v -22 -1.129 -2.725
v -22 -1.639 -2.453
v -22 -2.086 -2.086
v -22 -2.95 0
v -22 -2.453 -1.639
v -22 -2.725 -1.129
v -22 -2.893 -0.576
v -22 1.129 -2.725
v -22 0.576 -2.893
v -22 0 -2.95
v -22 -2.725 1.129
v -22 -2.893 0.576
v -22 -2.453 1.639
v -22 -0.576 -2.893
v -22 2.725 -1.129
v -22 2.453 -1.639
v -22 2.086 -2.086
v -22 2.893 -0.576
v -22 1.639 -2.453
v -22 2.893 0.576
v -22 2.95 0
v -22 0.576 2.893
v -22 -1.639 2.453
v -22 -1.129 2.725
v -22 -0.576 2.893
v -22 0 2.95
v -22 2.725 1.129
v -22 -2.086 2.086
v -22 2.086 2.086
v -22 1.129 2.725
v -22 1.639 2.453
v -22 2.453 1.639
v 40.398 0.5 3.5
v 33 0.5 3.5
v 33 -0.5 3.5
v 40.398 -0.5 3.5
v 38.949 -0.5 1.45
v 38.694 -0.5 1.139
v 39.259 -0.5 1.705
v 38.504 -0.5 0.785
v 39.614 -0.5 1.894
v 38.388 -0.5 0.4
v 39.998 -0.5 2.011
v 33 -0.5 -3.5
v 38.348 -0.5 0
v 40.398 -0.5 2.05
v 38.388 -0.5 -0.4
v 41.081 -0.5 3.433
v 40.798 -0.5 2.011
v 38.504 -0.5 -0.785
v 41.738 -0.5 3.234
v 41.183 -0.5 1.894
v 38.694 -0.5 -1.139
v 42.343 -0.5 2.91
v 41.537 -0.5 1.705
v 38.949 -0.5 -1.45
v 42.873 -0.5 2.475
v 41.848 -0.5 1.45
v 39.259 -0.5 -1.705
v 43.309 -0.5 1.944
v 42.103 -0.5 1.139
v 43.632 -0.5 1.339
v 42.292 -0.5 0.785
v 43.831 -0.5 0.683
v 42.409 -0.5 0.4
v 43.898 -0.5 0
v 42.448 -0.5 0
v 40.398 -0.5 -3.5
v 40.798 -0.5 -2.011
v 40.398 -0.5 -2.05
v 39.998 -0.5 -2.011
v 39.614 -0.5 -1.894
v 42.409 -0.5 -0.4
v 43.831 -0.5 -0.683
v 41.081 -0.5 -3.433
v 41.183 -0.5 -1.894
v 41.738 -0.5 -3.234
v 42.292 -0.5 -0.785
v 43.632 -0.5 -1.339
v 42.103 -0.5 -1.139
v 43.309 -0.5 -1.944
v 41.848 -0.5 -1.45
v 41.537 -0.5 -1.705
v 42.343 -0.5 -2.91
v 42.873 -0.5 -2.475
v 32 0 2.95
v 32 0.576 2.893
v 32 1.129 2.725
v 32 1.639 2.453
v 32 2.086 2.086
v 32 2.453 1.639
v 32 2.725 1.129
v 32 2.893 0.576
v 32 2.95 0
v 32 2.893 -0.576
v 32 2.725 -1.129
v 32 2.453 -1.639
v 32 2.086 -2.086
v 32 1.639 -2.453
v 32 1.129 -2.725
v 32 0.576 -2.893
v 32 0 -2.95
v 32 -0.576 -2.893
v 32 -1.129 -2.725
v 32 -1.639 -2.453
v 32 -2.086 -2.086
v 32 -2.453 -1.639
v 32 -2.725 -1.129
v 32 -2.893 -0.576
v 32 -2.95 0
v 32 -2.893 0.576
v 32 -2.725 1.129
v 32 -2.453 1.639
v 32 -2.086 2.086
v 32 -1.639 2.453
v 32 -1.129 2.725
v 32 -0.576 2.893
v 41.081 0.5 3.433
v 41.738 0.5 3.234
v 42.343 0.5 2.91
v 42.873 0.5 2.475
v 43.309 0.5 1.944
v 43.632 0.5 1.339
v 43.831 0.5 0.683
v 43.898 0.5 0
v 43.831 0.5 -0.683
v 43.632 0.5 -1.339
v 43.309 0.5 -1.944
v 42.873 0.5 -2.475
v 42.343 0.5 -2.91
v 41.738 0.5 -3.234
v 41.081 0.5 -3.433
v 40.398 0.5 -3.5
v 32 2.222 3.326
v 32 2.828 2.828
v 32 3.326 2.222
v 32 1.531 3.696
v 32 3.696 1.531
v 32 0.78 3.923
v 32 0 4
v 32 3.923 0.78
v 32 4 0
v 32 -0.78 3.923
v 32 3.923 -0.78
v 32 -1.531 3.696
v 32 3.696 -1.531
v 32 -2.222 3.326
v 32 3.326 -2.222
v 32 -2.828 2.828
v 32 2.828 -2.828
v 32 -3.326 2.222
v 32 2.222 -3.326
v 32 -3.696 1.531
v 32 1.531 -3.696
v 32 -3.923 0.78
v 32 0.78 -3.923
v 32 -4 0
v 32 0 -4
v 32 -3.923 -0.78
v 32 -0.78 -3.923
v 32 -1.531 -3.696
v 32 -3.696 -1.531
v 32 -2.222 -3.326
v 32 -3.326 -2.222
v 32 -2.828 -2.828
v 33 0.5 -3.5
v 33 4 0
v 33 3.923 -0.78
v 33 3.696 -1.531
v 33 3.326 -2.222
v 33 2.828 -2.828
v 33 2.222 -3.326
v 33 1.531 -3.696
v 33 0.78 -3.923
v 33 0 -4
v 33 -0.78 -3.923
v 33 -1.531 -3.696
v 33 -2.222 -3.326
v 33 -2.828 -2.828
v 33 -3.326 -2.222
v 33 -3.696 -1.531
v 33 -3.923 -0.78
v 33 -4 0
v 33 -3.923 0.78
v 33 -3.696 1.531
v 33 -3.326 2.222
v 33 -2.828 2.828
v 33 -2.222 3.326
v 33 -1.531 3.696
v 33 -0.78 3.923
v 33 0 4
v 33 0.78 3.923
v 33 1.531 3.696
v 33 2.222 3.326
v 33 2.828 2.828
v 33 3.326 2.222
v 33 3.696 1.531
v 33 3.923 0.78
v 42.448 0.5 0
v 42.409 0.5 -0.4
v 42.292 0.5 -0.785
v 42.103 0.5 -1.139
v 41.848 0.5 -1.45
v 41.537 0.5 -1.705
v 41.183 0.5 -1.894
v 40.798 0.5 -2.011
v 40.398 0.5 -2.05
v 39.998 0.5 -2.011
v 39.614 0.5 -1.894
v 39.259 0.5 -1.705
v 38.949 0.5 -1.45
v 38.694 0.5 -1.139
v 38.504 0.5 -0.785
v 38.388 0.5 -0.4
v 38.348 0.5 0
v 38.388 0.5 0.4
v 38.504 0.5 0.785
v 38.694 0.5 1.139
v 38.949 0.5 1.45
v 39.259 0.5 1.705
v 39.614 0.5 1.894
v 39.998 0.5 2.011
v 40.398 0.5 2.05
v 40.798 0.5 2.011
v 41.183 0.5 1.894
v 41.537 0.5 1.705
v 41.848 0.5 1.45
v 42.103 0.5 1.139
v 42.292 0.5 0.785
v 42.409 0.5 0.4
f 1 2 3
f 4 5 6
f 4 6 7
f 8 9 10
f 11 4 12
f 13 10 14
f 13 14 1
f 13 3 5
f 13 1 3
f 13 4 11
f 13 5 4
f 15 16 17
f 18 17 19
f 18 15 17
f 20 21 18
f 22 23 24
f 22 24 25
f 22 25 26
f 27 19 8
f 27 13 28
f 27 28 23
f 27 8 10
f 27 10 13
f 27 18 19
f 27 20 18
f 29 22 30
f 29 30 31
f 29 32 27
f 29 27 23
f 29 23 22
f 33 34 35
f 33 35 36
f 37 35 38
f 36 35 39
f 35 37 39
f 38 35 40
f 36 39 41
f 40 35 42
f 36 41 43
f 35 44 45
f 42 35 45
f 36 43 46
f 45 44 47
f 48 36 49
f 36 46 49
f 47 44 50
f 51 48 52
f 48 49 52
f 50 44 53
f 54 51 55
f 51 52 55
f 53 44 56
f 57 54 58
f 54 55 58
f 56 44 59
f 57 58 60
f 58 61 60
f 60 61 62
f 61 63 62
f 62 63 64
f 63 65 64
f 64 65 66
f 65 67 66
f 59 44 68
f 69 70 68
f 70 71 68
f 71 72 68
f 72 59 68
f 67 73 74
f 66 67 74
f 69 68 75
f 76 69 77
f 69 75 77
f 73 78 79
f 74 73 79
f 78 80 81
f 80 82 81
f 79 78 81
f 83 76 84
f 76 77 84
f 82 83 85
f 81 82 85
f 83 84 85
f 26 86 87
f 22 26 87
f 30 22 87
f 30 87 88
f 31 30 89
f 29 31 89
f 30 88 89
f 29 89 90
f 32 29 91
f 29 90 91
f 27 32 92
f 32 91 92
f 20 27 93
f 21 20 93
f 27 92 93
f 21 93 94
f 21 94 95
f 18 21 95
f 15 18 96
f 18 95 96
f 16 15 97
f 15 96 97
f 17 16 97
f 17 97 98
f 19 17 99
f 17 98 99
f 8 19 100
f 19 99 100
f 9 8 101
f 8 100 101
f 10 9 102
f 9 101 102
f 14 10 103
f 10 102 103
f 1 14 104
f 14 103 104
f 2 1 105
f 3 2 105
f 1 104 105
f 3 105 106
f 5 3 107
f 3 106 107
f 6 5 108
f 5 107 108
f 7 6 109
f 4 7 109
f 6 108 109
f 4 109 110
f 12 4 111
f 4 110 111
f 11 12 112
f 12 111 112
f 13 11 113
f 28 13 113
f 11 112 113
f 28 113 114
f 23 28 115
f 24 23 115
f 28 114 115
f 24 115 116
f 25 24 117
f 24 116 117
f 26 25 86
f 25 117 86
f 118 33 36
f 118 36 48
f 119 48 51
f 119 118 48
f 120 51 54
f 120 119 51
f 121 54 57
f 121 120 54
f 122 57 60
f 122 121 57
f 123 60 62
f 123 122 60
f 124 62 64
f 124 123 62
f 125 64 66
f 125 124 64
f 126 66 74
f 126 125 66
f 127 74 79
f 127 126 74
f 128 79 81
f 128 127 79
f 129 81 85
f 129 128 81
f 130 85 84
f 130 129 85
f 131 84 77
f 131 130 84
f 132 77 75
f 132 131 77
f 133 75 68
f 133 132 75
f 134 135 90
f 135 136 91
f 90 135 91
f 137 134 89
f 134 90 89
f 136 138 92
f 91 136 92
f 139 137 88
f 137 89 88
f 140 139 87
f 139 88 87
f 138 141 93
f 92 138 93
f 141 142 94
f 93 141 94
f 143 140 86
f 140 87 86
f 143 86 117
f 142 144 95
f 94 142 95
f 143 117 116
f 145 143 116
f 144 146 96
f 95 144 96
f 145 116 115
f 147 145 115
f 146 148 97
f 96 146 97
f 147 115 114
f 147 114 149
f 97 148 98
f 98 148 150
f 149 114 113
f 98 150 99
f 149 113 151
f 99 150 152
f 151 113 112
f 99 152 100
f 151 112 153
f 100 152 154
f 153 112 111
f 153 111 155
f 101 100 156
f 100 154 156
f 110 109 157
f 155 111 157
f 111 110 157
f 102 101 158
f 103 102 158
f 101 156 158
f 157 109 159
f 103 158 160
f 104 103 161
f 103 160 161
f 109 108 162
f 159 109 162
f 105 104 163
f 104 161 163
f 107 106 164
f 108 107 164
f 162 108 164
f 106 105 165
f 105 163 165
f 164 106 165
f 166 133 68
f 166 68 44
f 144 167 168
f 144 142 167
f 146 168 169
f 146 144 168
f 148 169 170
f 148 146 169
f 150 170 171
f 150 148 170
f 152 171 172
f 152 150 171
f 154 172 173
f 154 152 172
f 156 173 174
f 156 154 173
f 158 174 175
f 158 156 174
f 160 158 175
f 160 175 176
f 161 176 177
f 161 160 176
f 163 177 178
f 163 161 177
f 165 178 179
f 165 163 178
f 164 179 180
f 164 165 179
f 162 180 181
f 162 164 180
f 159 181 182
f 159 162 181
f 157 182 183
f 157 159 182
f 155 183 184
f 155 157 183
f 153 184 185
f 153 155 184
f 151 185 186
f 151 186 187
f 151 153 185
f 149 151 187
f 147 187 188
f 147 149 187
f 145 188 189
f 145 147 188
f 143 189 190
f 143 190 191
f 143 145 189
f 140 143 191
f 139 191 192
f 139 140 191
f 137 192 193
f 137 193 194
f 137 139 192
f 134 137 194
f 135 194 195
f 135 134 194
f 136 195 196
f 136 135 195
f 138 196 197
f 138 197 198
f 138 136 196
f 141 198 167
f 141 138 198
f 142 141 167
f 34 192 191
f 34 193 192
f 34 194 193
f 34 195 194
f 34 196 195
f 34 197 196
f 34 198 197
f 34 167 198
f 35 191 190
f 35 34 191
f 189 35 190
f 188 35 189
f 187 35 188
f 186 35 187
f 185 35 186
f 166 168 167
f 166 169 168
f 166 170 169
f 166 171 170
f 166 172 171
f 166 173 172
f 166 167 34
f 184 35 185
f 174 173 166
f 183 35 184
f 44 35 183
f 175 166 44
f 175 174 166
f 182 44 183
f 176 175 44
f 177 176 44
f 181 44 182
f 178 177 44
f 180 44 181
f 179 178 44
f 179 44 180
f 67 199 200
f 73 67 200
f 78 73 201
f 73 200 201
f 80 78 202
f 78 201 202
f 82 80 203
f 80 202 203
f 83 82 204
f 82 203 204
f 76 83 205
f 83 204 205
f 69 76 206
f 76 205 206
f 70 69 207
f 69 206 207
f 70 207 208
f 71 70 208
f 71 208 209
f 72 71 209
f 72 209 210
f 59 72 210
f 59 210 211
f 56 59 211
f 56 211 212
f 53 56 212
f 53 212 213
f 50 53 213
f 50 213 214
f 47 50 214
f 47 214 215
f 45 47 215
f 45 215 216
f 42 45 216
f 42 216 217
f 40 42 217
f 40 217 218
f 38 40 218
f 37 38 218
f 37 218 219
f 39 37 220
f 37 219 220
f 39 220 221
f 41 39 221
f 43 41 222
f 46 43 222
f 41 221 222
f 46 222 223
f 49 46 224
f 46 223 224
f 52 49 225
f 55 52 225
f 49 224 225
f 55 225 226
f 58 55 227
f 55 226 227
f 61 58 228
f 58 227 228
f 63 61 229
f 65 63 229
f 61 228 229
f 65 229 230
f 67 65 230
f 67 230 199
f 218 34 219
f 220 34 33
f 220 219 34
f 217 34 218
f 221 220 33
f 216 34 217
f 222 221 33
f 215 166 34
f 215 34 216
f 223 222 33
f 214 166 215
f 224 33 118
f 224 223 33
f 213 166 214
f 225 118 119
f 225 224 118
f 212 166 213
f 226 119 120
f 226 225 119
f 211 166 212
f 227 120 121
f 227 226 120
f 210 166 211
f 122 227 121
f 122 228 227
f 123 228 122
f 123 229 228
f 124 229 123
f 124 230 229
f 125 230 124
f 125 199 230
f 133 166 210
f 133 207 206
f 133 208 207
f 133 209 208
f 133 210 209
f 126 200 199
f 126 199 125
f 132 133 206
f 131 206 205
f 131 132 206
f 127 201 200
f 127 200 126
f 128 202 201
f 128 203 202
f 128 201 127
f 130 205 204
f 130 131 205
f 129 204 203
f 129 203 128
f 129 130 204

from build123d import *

# Parameters (mm, degrees)
SKETCH1_W                  = 1
SKETCH1_H                  = 4
BOSS_EXTRUDE1_DEPTH        = 1
SKETCH3_R                  = 2.95
BOSS_EXTRUDE2_DEPTH        = 54
F_4_1_4_1_DIAMETER_HOLE1_D = 4.1


with BuildPart() as part:
    # Sketch1 → Revolve1 (revolve)
    with BuildSketch(Plane(origin=(0, 0, 0), x_dir=(-1, 0, 0), z_dir=(0, 0, -1))):
        with Locations((-32.5, 2)):
            Rectangle(SKETCH1_W, SKETCH1_H)
    revolve(axis=Axis((33, 0, 0), (-1, 0, 0)))

    # Sketch2 → Boss-Extrude1 (add)
    with BuildSketch(Plane(origin=(0, 0.5, 0), x_dir=(1, 0, 0), z_dir=(0, 1, 0))):
        with BuildLine():
            Line((33, 3.5), (33, -3.5))
            Line((33, -3.5), (40.398405894, -3.5))
            ThreePointArc((40.398405894, -3.5), (43.898405894, 0), (40.398405894, 3.5))
            Line((40.398405894, 3.5), (33, 3.5))
        make_face()
    extrude(amount=-BOSS_EXTRUDE1_DEPTH)

    # Sketch3 → Boss-Extrude2 (add)
    with BuildSketch(Plane.ZY.offset(-32)):
        Circle(SKETCH3_R)
    extrude(amount=BOSS_EXTRUDE2_DEPTH)

    # Ø4.1 (4.1) Diameter Hole1 (through all)
    with Locations(Plane(origin=(0, -0.5, 0), x_dir=(-1, 0, 0), z_dir=(0, -1, 0))):
        with Locations((-40.398405894, 0)):
            Hole(F_4_1_4_1_DIAMETER_HOLE1_D / 2)


solid = part.part
